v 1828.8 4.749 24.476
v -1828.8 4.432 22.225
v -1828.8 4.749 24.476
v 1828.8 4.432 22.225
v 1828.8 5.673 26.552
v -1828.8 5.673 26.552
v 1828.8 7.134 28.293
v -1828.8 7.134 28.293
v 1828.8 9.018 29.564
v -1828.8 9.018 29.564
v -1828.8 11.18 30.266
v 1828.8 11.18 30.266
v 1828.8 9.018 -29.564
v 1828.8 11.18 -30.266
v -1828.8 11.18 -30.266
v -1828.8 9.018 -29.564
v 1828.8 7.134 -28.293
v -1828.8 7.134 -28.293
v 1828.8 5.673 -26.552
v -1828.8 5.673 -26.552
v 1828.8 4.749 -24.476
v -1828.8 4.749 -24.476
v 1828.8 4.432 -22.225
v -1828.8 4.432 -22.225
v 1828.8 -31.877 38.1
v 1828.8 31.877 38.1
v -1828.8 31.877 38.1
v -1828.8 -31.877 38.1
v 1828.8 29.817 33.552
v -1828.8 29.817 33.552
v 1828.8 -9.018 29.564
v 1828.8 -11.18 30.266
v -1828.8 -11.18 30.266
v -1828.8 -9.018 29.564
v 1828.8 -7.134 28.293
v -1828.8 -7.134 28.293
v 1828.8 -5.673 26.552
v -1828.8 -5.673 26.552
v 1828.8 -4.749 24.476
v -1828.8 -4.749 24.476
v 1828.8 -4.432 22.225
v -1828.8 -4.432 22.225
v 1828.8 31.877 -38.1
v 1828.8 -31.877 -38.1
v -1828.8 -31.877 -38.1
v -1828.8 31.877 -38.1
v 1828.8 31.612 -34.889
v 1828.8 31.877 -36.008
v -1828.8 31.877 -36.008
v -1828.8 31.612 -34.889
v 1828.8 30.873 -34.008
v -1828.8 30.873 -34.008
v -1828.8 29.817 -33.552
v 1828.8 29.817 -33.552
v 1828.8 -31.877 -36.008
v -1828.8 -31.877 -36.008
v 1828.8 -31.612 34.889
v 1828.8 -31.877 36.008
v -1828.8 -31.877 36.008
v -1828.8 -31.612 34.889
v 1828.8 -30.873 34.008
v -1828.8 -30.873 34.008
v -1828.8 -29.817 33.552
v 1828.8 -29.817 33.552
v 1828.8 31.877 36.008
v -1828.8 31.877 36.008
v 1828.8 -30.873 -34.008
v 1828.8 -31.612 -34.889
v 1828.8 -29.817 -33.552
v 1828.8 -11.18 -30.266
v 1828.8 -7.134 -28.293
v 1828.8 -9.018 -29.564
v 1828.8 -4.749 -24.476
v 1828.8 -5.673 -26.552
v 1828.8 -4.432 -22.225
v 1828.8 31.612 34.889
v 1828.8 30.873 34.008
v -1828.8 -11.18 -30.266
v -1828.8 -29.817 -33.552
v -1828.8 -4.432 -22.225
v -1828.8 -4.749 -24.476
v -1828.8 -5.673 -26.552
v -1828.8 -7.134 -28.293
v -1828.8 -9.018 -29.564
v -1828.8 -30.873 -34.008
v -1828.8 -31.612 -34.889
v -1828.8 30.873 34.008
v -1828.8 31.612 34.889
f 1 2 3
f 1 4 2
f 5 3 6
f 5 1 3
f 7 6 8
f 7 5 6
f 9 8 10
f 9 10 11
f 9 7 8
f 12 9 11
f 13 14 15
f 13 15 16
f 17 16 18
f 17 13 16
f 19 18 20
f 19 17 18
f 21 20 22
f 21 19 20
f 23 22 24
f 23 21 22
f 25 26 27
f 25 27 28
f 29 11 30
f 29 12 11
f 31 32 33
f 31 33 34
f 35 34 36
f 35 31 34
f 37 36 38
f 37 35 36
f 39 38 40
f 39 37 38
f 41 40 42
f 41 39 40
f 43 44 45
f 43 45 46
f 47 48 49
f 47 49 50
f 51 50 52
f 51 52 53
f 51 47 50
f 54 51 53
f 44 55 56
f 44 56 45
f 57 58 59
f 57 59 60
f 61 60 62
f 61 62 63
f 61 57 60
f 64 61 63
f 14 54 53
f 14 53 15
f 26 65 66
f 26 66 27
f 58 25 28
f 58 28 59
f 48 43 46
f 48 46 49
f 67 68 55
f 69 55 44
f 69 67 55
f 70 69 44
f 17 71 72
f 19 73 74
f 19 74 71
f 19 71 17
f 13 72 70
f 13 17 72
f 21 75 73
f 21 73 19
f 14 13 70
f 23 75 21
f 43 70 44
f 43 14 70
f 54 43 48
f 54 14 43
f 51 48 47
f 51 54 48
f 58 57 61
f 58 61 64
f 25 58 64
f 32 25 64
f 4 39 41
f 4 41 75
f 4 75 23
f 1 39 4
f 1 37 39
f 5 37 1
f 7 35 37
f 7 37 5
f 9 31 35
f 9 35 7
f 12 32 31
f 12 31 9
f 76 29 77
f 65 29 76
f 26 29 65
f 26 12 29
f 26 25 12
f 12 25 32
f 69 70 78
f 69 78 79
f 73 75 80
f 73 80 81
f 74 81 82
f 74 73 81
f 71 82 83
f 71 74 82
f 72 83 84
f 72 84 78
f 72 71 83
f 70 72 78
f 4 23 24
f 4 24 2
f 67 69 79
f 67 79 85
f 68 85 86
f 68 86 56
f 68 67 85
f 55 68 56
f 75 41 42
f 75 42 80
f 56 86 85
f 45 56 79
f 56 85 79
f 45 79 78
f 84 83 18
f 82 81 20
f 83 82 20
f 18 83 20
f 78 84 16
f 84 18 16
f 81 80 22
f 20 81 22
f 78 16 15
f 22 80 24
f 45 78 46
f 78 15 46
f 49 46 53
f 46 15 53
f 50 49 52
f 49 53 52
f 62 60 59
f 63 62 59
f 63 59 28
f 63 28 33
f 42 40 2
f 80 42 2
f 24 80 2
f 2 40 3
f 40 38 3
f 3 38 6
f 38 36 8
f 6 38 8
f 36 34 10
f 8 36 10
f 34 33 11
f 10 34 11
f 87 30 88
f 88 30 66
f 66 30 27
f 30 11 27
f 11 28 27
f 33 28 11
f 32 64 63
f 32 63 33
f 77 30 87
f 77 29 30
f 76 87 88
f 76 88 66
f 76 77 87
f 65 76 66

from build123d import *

# Parameters (mm, degrees)
F1_DEPTH = 1828.8


# Not quite as in the source:
# - ends of sketch curves that miss each other by under 0.0002 mm in the source are joined


with BuildPart() as f1:
    # F0 (on Right) → F1 (new body, symmetric)
    with BuildSketch(Plane.YZ):
        with BuildLine():
            ThreePointArc((29.8166013588, 33.5523159732), (31.2936627946, 34.4050969282), (31.877, 36.007802))
            Line((31.877, 36.007802), (31.877, 38.1))
            Line((31.877, 38.1), (-31.877, 38.1))
            Line((-31.877, 38.1), (-31.877, 36.007802))
            ThreePointArc((-31.877, 36.007802), (-31.2936627946, 34.4050969282), (-29.8166013588, 33.5523159732))
            Line((-29.8166013588, 33.5523159732), (-11.1795814, 30.2661066))
            ThreePointArc((-11.1795814, 30.2661066), (-6.3425799325, 27.4734582433), (-4.4323, 22.225))
            Line((-4.4323, 22.225), (-4.4323, -22.225))
            ThreePointArc((-4.4323, -22.225), (-6.3425799325, -27.4734582433), (-11.1795807041, -30.2661105468))
            Line((-11.1795807041, -30.2661105468), (-29.8166028, -33.5523078))
            ThreePointArc((-29.8166028, -33.5523078), (-31.2936627946, -34.4050969282), (-31.877, -36.007802))
            Line((-31.877, -36.007802), (-31.877, -38.1))
            Line((-31.877, -38.1), (31.877, -38.1))
            Line((31.877, -38.1), (31.877, -36.007802))
            ThreePointArc((31.877, -36.007802), (31.2936627946, -34.4050969282), (29.8166013588, -33.5523159732))
            Line((29.8166013588, -33.5523159732), (11.1795814, -30.2661066))
            ThreePointArc((11.1795814, -30.2661066), (6.3425799325, -27.4734582433), (4.4323, -22.225))
            Line((4.4323, -22.225), (4.4323, 22.225))
            ThreePointArc((4.4323, 22.225), (6.3425799325, 27.4734582433), (11.1795807041, 30.2661105468))
            Line((11.1795807041, 30.2661105468), (29.8166013588, 33.5523159732))
        make_face()
    extrude(amount=F1_DEPTH, both=True)


solid = f1.part
